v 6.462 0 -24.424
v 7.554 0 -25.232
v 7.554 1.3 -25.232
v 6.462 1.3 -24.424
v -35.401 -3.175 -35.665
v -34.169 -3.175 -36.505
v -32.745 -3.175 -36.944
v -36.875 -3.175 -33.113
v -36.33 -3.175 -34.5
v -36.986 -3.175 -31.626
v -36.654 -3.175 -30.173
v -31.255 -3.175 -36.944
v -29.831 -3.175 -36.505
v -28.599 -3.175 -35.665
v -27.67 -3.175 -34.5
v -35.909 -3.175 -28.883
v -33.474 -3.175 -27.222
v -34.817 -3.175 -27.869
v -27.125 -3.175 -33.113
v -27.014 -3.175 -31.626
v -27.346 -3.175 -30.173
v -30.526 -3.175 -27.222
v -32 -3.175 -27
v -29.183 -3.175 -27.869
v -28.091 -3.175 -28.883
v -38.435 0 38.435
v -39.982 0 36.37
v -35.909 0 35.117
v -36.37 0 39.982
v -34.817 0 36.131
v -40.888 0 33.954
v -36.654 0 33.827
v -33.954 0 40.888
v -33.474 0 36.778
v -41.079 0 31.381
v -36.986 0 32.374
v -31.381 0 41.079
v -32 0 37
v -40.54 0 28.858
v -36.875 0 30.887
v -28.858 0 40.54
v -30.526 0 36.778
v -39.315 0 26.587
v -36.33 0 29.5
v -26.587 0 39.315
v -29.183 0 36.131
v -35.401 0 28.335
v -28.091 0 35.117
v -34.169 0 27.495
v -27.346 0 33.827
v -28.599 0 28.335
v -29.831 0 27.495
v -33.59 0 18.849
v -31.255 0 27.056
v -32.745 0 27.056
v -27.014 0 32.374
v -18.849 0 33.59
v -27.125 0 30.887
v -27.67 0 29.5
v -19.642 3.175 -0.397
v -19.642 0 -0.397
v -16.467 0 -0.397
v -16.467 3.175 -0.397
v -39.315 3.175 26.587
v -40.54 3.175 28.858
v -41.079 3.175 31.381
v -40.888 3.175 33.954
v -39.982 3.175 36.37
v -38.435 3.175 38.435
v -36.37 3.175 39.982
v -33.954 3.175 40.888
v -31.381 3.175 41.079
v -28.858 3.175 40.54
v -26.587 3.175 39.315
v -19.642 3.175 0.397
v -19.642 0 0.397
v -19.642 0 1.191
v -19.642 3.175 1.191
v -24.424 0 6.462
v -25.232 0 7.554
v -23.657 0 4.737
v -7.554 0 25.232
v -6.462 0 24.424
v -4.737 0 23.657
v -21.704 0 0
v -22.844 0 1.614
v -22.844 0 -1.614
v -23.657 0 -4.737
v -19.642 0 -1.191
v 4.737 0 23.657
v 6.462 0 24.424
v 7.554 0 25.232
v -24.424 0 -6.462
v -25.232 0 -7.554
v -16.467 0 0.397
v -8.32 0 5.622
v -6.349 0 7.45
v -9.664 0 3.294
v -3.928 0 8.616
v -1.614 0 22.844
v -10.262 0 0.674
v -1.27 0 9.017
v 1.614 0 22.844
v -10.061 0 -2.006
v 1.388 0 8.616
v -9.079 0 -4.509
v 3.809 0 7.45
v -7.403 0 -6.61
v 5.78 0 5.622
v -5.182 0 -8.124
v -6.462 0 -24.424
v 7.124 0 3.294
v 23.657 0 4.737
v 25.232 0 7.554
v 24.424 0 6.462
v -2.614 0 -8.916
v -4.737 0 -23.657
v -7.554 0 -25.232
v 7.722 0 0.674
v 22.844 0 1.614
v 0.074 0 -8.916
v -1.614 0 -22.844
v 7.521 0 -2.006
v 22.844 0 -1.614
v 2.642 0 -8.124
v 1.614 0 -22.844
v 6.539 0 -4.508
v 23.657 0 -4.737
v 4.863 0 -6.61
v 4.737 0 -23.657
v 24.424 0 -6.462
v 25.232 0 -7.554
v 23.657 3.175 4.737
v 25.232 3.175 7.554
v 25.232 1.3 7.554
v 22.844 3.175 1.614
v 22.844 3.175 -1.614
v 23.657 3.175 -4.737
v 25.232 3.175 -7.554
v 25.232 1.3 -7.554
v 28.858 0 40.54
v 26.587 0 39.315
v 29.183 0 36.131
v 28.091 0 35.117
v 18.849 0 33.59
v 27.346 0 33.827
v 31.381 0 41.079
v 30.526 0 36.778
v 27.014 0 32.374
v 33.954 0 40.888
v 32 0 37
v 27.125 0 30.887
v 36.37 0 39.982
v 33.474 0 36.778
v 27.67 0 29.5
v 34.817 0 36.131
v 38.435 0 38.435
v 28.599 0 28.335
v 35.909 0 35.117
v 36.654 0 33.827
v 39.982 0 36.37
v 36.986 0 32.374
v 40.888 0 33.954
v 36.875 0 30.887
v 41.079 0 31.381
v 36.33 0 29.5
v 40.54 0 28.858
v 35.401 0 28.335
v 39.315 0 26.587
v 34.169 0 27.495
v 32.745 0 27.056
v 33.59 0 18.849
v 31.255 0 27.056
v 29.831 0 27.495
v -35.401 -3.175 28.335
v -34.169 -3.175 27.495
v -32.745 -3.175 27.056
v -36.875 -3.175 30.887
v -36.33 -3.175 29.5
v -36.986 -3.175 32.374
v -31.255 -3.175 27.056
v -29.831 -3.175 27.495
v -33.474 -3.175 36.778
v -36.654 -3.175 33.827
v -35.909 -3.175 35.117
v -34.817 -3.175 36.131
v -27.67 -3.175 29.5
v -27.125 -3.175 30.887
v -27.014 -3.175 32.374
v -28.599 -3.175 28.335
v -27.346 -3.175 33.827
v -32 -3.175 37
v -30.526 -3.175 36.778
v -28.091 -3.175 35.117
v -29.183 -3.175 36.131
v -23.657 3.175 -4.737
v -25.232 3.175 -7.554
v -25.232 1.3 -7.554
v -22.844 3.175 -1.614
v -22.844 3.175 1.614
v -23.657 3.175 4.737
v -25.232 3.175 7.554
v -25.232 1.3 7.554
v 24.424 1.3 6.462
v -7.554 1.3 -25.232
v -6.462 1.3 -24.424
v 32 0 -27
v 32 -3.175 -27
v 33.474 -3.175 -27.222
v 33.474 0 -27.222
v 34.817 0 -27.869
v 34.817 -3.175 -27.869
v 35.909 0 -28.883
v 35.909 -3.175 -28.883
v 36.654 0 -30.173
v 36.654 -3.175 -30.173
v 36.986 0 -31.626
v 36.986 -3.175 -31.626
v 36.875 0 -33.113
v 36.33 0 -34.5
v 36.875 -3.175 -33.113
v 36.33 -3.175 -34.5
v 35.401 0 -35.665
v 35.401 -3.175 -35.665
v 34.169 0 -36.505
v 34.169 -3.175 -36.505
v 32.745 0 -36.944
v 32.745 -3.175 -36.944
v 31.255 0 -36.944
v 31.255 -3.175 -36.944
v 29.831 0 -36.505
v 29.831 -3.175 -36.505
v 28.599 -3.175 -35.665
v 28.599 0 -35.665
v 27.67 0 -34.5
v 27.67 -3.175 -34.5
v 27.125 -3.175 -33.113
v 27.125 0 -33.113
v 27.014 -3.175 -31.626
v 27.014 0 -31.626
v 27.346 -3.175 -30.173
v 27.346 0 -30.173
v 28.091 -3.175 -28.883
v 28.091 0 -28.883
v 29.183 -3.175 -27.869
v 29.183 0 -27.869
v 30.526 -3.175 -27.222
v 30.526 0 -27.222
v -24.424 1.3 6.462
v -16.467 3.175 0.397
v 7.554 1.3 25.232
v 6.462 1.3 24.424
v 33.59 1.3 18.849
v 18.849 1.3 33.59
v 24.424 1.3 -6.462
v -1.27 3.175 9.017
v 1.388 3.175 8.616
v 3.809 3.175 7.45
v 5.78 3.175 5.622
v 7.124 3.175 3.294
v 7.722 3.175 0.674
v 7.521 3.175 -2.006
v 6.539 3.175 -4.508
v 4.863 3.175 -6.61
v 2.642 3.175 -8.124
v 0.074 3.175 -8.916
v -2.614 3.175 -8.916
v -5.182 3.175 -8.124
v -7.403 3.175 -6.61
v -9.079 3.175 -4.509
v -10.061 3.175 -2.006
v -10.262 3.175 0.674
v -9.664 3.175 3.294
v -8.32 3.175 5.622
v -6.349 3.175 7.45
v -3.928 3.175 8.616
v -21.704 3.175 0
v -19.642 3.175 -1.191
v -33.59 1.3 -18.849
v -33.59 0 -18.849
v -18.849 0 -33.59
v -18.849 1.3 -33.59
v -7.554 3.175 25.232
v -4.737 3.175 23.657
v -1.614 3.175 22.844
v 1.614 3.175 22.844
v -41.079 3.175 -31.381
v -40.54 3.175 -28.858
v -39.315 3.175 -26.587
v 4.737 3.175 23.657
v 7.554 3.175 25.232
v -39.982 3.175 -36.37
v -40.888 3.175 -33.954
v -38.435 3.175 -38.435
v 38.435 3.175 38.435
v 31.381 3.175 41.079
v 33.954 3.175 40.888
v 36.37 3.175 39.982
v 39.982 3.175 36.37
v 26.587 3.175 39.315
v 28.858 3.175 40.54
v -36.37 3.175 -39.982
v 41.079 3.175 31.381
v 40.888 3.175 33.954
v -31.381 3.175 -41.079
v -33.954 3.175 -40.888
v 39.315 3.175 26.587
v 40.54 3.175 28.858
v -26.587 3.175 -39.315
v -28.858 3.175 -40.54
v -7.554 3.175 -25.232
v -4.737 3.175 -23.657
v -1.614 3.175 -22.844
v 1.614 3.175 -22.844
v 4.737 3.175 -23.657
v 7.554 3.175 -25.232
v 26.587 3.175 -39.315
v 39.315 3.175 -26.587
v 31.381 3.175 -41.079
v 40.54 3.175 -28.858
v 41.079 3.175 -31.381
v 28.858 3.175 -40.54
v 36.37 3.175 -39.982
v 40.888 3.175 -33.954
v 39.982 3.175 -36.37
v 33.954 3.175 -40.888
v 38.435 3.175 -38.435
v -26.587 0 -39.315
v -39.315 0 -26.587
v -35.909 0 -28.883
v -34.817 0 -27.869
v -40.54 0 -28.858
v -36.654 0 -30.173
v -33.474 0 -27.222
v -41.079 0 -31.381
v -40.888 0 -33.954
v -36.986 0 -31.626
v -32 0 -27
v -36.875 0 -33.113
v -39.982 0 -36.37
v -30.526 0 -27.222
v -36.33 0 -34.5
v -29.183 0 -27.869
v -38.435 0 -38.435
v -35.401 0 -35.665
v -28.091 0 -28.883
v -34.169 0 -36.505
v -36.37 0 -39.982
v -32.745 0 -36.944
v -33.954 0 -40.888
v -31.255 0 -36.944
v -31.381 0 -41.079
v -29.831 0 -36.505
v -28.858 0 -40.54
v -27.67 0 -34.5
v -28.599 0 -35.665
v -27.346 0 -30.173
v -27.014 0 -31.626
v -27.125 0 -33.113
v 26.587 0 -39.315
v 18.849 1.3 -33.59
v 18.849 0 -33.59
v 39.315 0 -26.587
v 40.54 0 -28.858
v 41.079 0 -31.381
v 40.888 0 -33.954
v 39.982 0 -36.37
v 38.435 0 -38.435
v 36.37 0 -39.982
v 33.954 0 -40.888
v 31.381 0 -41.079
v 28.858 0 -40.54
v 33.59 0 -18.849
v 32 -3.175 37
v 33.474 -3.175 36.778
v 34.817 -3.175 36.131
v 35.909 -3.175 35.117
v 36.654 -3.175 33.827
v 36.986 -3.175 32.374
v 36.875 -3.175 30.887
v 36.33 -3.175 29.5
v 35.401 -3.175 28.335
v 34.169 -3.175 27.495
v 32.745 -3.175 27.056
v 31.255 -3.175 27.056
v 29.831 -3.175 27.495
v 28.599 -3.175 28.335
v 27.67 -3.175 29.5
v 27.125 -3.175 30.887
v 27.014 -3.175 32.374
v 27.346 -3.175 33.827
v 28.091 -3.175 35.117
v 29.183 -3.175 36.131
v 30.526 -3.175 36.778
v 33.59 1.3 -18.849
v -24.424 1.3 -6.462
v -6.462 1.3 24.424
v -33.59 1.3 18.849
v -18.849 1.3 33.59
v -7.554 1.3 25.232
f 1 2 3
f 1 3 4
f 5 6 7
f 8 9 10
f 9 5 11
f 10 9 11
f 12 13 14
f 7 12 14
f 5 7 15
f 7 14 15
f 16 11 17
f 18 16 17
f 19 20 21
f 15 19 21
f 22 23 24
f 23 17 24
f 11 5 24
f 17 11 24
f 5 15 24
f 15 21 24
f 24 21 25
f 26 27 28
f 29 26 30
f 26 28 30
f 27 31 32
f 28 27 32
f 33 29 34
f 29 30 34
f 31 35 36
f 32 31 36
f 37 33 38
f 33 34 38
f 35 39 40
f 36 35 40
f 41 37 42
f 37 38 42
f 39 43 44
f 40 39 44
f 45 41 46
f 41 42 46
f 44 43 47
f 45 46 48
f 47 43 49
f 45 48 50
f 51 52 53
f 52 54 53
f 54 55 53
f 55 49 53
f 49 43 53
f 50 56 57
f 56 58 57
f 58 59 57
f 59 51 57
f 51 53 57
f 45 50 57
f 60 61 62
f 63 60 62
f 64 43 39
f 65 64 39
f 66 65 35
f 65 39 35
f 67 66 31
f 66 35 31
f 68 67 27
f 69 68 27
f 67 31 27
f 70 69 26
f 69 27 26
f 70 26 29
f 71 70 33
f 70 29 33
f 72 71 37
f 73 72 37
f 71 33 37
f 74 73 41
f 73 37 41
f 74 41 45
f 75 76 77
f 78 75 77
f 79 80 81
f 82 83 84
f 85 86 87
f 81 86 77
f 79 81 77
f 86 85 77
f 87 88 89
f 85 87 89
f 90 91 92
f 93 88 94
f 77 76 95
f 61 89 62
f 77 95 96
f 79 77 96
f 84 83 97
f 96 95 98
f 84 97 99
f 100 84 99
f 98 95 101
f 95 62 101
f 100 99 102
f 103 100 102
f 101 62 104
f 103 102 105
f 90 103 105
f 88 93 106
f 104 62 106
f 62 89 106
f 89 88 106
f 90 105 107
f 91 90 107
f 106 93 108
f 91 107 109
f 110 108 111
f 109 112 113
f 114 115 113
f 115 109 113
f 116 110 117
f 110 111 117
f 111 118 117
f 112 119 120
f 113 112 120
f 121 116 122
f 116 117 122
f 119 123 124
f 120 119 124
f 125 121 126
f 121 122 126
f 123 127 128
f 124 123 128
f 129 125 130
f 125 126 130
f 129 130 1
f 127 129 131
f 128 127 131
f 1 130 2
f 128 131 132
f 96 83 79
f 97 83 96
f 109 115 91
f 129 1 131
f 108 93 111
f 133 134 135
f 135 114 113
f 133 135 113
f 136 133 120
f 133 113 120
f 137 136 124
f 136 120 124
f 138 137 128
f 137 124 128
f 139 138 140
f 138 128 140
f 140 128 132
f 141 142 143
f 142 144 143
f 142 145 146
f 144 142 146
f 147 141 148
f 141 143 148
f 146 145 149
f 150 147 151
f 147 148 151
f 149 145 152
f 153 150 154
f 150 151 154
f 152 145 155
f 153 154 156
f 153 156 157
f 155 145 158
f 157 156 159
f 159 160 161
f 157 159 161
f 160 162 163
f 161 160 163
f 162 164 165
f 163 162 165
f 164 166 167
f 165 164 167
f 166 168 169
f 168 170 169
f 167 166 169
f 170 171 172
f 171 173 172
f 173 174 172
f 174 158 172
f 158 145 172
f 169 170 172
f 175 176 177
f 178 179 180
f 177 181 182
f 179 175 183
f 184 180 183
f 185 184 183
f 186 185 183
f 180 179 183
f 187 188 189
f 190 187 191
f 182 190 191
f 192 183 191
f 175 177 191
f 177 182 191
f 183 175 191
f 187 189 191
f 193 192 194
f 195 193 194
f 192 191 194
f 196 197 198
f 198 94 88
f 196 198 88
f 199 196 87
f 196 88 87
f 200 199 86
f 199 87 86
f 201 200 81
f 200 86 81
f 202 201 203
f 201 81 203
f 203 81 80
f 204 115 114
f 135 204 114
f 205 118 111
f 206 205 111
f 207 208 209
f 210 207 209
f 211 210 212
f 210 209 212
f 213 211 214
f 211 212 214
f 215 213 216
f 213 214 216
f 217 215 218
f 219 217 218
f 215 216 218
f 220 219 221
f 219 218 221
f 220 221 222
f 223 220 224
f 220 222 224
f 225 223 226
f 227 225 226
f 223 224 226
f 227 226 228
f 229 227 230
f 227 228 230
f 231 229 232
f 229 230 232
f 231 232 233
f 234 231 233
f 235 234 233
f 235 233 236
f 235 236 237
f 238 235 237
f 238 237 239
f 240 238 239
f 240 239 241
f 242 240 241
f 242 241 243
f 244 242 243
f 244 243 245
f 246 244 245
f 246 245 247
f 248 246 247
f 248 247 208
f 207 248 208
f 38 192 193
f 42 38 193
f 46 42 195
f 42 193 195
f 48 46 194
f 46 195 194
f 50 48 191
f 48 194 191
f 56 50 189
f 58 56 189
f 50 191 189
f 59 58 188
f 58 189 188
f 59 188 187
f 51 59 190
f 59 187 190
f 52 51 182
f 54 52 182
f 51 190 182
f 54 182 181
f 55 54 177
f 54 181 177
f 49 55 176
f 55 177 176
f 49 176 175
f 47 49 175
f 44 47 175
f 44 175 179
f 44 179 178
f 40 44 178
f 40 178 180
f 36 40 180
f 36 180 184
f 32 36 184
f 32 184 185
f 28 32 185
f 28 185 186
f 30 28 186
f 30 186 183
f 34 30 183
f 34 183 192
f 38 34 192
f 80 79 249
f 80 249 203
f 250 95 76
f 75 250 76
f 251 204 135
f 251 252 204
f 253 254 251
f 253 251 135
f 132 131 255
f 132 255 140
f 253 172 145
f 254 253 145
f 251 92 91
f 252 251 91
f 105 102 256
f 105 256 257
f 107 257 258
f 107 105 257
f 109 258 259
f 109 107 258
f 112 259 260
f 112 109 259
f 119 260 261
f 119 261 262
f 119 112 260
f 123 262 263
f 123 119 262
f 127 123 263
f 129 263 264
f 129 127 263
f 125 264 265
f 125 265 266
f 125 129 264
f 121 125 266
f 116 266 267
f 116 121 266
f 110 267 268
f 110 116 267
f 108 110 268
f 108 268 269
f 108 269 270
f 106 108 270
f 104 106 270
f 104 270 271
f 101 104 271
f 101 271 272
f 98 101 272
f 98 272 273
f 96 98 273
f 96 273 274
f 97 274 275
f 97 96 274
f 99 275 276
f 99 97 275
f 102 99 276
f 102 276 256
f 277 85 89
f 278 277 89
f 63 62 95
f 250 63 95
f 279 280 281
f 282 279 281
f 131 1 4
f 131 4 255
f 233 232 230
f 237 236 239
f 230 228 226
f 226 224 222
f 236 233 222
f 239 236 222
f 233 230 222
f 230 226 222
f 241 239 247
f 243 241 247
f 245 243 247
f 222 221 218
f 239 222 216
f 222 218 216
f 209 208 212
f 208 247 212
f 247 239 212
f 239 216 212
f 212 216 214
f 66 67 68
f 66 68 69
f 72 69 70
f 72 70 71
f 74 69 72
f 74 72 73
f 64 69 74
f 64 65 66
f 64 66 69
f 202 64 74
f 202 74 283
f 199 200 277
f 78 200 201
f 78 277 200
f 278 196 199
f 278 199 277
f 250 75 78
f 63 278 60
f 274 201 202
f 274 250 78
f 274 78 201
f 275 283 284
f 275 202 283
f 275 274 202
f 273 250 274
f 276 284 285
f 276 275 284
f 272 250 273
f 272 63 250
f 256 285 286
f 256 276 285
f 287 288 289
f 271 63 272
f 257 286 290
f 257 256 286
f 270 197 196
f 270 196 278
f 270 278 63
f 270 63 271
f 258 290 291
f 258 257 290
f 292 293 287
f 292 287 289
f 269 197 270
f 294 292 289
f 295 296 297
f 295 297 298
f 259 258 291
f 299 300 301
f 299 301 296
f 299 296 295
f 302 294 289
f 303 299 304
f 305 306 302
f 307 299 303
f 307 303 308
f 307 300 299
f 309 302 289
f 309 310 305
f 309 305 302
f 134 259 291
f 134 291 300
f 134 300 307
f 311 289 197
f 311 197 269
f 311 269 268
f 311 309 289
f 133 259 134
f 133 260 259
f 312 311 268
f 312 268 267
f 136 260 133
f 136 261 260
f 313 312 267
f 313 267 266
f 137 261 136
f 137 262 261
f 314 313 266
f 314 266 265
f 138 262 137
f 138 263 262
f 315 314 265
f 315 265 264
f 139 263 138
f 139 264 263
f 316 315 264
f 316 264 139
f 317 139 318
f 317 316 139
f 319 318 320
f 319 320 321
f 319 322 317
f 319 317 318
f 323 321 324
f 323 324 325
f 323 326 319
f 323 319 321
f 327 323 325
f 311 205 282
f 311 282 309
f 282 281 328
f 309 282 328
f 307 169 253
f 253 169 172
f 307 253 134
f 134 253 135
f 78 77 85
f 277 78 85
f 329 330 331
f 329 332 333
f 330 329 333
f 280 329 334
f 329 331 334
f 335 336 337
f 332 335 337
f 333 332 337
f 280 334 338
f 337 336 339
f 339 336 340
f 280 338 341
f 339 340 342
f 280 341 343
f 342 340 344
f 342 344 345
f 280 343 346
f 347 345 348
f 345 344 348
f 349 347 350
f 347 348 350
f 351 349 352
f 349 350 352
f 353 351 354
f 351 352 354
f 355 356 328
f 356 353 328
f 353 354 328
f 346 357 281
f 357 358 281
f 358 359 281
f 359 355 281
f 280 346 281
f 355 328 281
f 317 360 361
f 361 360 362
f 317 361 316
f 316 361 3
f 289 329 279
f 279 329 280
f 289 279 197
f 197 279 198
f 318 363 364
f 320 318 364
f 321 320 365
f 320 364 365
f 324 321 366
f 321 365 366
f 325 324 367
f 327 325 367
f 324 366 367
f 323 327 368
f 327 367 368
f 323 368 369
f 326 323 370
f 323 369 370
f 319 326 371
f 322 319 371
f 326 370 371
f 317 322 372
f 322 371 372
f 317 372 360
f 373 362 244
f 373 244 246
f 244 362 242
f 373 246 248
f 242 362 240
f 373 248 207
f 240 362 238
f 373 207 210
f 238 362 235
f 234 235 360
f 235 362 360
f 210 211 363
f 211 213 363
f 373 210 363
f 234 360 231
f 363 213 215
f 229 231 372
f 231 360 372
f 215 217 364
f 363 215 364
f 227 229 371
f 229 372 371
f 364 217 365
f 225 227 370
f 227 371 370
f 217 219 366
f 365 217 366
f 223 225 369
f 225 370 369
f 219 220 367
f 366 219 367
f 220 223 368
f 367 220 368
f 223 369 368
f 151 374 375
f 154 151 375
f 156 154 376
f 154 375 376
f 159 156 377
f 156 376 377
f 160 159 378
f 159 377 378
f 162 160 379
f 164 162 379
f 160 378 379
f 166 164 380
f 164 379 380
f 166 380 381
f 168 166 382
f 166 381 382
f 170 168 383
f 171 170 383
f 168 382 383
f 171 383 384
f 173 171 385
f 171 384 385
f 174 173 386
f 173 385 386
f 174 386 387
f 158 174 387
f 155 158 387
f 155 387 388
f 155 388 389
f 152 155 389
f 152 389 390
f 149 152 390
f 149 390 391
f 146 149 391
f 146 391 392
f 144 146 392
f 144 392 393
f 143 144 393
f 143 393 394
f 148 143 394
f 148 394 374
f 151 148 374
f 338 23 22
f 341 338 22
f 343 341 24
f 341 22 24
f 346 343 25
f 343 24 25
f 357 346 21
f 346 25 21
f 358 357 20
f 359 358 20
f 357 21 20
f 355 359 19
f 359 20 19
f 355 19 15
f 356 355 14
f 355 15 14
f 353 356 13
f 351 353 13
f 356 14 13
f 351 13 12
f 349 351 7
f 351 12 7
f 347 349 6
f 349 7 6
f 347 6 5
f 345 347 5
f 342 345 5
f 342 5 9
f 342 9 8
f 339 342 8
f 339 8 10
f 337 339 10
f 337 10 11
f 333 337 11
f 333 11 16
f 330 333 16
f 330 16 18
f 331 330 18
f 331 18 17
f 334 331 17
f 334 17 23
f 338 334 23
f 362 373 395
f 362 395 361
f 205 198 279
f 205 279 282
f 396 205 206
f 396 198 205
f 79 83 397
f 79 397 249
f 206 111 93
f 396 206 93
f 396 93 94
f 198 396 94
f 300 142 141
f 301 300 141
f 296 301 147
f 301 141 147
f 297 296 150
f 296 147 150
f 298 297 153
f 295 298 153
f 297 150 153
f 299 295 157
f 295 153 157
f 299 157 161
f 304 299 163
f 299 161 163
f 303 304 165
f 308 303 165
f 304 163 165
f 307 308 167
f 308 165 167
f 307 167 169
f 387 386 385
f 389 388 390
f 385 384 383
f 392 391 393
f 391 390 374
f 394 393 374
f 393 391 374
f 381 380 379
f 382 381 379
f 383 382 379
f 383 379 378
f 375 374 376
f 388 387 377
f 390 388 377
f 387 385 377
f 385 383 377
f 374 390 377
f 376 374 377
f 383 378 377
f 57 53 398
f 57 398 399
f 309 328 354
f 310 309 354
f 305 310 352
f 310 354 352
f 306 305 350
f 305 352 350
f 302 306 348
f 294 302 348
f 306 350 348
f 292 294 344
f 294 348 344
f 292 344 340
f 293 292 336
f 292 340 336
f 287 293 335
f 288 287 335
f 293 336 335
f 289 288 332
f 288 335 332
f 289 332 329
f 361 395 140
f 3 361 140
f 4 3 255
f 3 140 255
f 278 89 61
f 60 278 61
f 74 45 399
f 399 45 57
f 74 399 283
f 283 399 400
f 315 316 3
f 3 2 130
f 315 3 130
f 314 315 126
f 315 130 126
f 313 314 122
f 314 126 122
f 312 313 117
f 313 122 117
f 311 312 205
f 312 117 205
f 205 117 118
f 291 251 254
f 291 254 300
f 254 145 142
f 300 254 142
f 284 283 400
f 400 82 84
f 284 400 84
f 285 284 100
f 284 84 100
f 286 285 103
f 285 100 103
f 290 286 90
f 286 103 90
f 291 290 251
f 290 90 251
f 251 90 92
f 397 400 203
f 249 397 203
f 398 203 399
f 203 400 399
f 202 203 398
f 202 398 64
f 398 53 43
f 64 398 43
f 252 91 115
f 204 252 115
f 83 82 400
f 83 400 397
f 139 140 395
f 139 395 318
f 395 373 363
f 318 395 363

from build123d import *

# Parameters (mm, degrees)
SKETCH1_R           = 5
SKETCH1_R_2         = 9.017
BOSS_EXTRUDE1_DEPTH = 3.175
BOSS_EXTRUDE2_START = -3.175
SKETCH1_3_R         = 5
BOSS_EXTRUDE2_DEPTH = 6.35
CUT_EXTRUDE1_DEPTH  = 1.3


with BuildPart() as part:
    # Sketch1 → Boss-Extrude1 (new body)
    with BuildSketch(Plane(origin=(0, 0, 0), x_dir=(1, 0, 0), z_dir=(0, 1, 0))):
        with BuildLine():
            Line((-39.315149004, 26.587226943), (-25.231781425, 7.554111896))
            ThreePointArc((-25.231781425, 7.554111896), (-22.740865295, 0), (-25.231781425, -7.554111896))
            Line((-25.231781425, -7.554111896), (-39.315149004, -26.587226943))
            ThreePointArc((-39.315149004, -26.587226943), (-38.434652948, -38.434652948), (-26.587226943, -39.315149004))
            Line((-26.587226943, -39.315149004), (-7.554111896, -25.231781425))
            ThreePointArc((-7.554111896, -25.231781425), (0, -22.740865295), (7.554111896, -25.231781425))
            Line((7.554111896, -25.231781425), (26.587226943, -39.315149004))
            ThreePointArc((26.587226943, -39.315149004), (38.434652948, -38.434652948), (39.315149004, -26.587226943))
            Line((39.315149004, -26.587226943), (25.231781425, -7.554111896))
            ThreePointArc((25.231781425, -7.554111896), (22.740865295, 0), (25.231781425, 7.554111896))
            Line((25.231781425, 7.554111896), (39.315149004, 26.587226943))
            ThreePointArc((39.315149004, 26.587226943), (38.434652948, 38.434652948), (26.587226943, 39.315149004))
            Line((26.587226943, 39.315149004), (7.554111896, 25.231781425))
            ThreePointArc((7.554111896, 25.231781425), (0, 22.740865295), (-7.554111896, 25.231781425))
            Line((-7.554111896, 25.231781425), (-26.587226943, 39.315149004))
            ThreePointArc((-26.587226943, 39.315149004), (-38.434652948, 38.434652948), (-39.315149004, 26.587226943))
        make_face()
        with Locations(Location((-32, -32, 0), (0, 0, 270))):
            Circle(SKETCH1_R, mode=Mode.SUBTRACT)
        with Locations(Location((32, -32, 0), (0, 0, 270))):
            Circle(SKETCH1_R, mode=Mode.SUBTRACT)
        Polygon((-19.642190111, 1.190625), (-19.642190111, 0.396875), (-16.467190111, 0.396875), (-16.467190111, -0.396875), (-19.642190111, -0.396875), (-19.642190111, -1.190625), (-21.704413103, 0), align=None, mode=Mode.SUBTRACT)
        with Locations(Location((-1.27, 0, 0), (0, 0, 270))):
            Circle(SKETCH1_R_2, mode=Mode.SUBTRACT)
        with Locations(Location((-32, 32, 0), (0, 0, 270))):
            Circle(SKETCH1_R, mode=Mode.SUBTRACT)
        with Locations(Location((32, 32, 0), (0, 0, 270))):
            Circle(SKETCH1_R, mode=Mode.SUBTRACT)
    extrude(amount=BOSS_EXTRUDE1_DEPTH)

    # Sketch1<3> → Boss-Extrude2 (add)
    with BuildSketch(Plane(origin=(0, 0, 0), x_dir=(1, 0, 0), z_dir=(0, 1, 0)).offset(BOSS_EXTRUDE2_START)):
        with Locations(Location((-32, 32, 0), (0, 0, 270))):
            Circle(SKETCH1_3_R)
        with Locations(Location((32, -32, 0), (0, 0, 270))):
            Circle(SKETCH1_3_R)
        with Locations(Location((32, 32, 0), (0, 0, 270))):
            Circle(SKETCH1_3_R)
        with Locations(Location((-32, -32, 0), (0, 0, 270))):
            Circle(SKETCH1_3_R)
    extrude(amount=BOSS_EXTRUDE2_DEPTH)

    # Sketch2 → Cut-Extrude1 (cut)
    with BuildSketch(Plane.XZ):
        Polygon((-6.462290551, -24.423898886), (-24.423898886, -6.462290551), (-33.589527929, -18.849276199), (-18.849276199, -33.589527929), align=None)
        Polygon((-33.589527929, 18.849276199), (-18.849276199, 33.589527929), (-6.462290551, 24.423898886), (-24.423898886, 6.462290551), align=None)
        Polygon((24.423898886, 6.462290551), (33.589527929, 18.849276199), (18.849276199, 33.589527929), (6.462290551, 24.423898886), align=None)
        Polygon((33.589527929, -18.849276199), (18.849276199, -33.589527929), (6.462290551, -24.423898886), (24.423898886, -6.462290551), align=None)
    extrude(amount=-CUT_EXTRUDE1_DEPTH, mode=Mode.SUBTRACT)


solid = part.part
